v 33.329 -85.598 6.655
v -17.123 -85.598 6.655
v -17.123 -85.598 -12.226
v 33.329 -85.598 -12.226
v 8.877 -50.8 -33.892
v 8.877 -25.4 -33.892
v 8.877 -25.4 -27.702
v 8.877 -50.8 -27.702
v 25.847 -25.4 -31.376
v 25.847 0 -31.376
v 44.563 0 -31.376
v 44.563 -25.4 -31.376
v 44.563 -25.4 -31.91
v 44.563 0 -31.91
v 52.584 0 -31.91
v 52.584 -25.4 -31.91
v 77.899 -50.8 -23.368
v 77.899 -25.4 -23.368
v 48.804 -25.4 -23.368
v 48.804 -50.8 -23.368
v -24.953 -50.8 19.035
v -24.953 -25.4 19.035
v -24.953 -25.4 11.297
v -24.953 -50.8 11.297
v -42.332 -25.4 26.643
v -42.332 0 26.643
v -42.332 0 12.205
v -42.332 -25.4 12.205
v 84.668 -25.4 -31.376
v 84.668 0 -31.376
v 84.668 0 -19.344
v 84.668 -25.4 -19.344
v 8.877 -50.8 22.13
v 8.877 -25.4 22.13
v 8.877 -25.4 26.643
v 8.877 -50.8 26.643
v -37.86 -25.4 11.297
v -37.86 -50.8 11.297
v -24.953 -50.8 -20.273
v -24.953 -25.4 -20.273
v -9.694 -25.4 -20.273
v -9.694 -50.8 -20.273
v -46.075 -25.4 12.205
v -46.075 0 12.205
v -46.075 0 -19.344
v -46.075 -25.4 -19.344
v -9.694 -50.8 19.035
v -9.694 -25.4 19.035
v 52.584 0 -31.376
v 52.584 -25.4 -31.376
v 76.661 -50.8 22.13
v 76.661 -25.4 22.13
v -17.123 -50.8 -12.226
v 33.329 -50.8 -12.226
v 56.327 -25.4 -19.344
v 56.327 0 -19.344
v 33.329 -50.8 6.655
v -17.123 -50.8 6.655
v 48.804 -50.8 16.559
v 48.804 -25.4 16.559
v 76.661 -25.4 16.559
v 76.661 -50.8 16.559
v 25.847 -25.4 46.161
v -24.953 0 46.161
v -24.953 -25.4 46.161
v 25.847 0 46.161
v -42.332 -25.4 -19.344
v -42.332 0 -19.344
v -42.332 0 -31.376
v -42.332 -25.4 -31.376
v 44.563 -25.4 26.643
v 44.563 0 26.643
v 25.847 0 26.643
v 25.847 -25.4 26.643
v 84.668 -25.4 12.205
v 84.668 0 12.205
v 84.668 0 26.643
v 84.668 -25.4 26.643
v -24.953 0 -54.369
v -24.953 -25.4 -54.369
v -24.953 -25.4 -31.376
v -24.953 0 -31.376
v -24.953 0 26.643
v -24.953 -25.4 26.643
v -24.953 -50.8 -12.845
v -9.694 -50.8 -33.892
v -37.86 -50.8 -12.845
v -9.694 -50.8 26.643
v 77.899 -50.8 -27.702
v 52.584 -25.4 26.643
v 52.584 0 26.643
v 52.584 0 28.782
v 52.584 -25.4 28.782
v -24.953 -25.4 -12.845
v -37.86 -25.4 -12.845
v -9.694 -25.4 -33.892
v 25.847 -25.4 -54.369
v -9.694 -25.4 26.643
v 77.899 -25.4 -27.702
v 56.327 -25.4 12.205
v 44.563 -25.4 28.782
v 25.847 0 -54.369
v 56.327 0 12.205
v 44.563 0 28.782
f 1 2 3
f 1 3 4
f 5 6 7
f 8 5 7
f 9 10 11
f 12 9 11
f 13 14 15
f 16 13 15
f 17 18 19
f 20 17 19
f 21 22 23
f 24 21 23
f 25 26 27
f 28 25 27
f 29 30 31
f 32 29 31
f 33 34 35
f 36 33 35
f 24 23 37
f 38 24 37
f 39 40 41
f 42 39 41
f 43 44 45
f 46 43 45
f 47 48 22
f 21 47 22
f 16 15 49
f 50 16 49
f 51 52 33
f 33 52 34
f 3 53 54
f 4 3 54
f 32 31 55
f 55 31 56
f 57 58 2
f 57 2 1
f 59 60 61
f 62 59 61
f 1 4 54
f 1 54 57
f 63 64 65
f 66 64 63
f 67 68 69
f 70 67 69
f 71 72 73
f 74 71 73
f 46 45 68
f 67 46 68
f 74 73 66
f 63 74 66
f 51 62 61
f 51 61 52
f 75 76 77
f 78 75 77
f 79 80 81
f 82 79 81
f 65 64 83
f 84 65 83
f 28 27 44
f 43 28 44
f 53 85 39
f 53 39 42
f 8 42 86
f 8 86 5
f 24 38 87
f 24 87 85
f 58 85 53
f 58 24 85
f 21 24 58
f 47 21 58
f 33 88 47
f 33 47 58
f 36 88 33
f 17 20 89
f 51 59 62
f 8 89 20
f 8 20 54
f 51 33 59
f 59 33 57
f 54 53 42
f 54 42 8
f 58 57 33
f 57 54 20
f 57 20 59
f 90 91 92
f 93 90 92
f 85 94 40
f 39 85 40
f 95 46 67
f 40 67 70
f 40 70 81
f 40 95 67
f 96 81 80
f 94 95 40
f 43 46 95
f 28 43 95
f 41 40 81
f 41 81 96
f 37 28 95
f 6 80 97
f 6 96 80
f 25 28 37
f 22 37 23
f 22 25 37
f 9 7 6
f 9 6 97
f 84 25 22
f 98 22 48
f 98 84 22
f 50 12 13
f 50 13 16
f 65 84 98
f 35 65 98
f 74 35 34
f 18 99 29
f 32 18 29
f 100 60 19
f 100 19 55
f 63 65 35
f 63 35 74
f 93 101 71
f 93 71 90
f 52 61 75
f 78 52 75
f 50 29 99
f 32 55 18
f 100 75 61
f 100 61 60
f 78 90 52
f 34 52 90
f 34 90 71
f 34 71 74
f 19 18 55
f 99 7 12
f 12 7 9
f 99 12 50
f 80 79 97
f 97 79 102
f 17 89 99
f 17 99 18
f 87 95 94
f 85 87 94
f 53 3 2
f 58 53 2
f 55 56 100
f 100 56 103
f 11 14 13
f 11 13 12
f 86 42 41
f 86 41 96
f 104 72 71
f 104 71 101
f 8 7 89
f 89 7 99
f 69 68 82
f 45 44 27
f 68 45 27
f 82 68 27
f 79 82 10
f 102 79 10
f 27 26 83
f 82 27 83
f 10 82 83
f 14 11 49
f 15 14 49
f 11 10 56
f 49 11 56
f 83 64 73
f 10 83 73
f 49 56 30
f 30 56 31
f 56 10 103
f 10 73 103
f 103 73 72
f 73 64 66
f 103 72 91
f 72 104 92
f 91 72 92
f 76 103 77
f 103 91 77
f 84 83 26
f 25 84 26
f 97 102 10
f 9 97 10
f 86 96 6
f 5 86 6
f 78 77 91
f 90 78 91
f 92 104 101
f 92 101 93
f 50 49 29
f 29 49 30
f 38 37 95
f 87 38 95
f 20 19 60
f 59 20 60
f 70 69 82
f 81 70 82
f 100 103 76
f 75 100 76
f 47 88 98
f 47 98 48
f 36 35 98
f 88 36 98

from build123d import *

# Parameters (mm, degrees)
F0_W     = 50.8
F0_H     = 19.5178945826
F0_H_2   = 14.4378958169
F0_W_2   = 18.715784845
F0_W_3   = 8.0210510887
F0_H_3   = 2.1389448998
F0_H_4   = 12.0315781759
F0_H_5   = 22.9936808162
F0_H_6   = 0.5347377678
F1_DEPTH = 25.4
F3_DEPTH = 25.4
F4_W     = 50.4511781037
F4_H     = 18.8805037178
F5_DEPTH = 34.798


with BuildPart() as f1:
    # F0 (on Front) → F1 (new body)
    with BuildSketch(Plane.XZ):
        with Locations((0.4468671068, 36.4022840108)):
            Rectangle(F0_W, F0_H)
        with Locations((0.4468671068, 19.4243888111)):
            Rectangle(F0_W, F0_H_2)
        Polygon((-24.9531328932, 12.2054409026), (-24.9531328932, 26.6433367195), (-42.332081033, 26.6433367195), (-42.332081033, 12.2054409026), (-46.0752392364, 12.2054409026), (-46.0752392364, -19.3440310844), (-42.332081033, -19.3440310844), (-42.332081033, -31.3756092603), (-24.9531328932, -31.3756092603), (-24.9531328932, -19.3440310844), (25.8468671068, -19.3440310844), (44.5626519519, -19.3440310844), (52.5837030406, -19.3440310844), (56.3268581581, -19.3440310844), (56.3268581581, 12.2054409026), (52.5837030406, 12.2054409026), (44.5626519519, 12.2054409026), (25.8468671068, 12.2054409026), align=None)
        with Locations((35.2047595293, 19.4243888111)):
            Rectangle(F0_W_2, F0_H_2)
        with Locations((48.5731774962, 19.4243888111)):
            Rectangle(F0_W_3, F0_H_2)
        with Locations((48.5731774962, 27.7128091694)):
            Rectangle(F0_W_3, F0_H_3)
        Polygon((84.667918967, 26.6433367195), (52.5837030406, 26.6433367195), (52.5837030406, 12.2054409026), (56.3268581581, 12.2054409026), (84.667918967, 12.2054409026), align=None)
        Polygon((84.667918967, -19.3440310844), (56.3268581581, -19.3440310844), (52.5837030406, -19.3440310844), (52.5837030406, -31.3756092603), (84.667918967, -31.3756092603), align=None)
        with Locations((48.5731774962, -25.3598201724)):
            Rectangle(F0_W_3, F0_H_4)
        with Locations((0.4468671068, -25.3598201724)):
            Rectangle(F0_W, F0_H_4)
        with Locations((0.4468671068, -42.8724496684)):
            Rectangle(F0_W, F0_H_5)
        with Locations((35.2047595293, -25.3598201724)):
            Rectangle(F0_W_2, F0_H_4)
        with Locations((48.5731774962, -31.6429781442)):
            Rectangle(F0_W_3, F0_H_6)
    extrude(amount=F1_DEPTH)

    # F2 (on face) → F3 (join)
    with BuildSketch(Plane.XZ.offset(25.4)):
        Polygon((8.8767074049, 26.6433367195), (-9.6942791715, 26.6433367195), (-9.6942791715, 19.0352611244), (-24.9531328932, 19.0352611244), (-24.9531328932, 11.2973507494), (-37.8602743149, 11.2973507494), (-37.8602743149, -12.8449322656), (-24.9531328932, -12.8449322656), (-24.9531328932, -20.2733278275), (-9.6942791715, -20.2733278275), (-9.6942791715, -33.8920503855), (8.8767074049, -33.8920503855), (8.8767074049, -27.701722458), (77.8988748789, -27.701722458), (77.8988748789, -23.3684927225), (48.8043278456, -23.3684927225), (48.8043278456, 16.5591295809), (76.6608119011, 16.5591295809), (76.6608119011, 22.1304260194), (8.8767074049, 22.1304260194), align=None)
    extrude(amount=F3_DEPTH)

    # F4 (on face) → F5 (join)
    with BuildSketch(Plane.XZ.offset(50.8)):
        with Locations((8.1029143184, -2.7856479865)):
            Rectangle(F4_W, F4_H)
    extrude(amount=F5_DEPTH)


solid = f1.part
